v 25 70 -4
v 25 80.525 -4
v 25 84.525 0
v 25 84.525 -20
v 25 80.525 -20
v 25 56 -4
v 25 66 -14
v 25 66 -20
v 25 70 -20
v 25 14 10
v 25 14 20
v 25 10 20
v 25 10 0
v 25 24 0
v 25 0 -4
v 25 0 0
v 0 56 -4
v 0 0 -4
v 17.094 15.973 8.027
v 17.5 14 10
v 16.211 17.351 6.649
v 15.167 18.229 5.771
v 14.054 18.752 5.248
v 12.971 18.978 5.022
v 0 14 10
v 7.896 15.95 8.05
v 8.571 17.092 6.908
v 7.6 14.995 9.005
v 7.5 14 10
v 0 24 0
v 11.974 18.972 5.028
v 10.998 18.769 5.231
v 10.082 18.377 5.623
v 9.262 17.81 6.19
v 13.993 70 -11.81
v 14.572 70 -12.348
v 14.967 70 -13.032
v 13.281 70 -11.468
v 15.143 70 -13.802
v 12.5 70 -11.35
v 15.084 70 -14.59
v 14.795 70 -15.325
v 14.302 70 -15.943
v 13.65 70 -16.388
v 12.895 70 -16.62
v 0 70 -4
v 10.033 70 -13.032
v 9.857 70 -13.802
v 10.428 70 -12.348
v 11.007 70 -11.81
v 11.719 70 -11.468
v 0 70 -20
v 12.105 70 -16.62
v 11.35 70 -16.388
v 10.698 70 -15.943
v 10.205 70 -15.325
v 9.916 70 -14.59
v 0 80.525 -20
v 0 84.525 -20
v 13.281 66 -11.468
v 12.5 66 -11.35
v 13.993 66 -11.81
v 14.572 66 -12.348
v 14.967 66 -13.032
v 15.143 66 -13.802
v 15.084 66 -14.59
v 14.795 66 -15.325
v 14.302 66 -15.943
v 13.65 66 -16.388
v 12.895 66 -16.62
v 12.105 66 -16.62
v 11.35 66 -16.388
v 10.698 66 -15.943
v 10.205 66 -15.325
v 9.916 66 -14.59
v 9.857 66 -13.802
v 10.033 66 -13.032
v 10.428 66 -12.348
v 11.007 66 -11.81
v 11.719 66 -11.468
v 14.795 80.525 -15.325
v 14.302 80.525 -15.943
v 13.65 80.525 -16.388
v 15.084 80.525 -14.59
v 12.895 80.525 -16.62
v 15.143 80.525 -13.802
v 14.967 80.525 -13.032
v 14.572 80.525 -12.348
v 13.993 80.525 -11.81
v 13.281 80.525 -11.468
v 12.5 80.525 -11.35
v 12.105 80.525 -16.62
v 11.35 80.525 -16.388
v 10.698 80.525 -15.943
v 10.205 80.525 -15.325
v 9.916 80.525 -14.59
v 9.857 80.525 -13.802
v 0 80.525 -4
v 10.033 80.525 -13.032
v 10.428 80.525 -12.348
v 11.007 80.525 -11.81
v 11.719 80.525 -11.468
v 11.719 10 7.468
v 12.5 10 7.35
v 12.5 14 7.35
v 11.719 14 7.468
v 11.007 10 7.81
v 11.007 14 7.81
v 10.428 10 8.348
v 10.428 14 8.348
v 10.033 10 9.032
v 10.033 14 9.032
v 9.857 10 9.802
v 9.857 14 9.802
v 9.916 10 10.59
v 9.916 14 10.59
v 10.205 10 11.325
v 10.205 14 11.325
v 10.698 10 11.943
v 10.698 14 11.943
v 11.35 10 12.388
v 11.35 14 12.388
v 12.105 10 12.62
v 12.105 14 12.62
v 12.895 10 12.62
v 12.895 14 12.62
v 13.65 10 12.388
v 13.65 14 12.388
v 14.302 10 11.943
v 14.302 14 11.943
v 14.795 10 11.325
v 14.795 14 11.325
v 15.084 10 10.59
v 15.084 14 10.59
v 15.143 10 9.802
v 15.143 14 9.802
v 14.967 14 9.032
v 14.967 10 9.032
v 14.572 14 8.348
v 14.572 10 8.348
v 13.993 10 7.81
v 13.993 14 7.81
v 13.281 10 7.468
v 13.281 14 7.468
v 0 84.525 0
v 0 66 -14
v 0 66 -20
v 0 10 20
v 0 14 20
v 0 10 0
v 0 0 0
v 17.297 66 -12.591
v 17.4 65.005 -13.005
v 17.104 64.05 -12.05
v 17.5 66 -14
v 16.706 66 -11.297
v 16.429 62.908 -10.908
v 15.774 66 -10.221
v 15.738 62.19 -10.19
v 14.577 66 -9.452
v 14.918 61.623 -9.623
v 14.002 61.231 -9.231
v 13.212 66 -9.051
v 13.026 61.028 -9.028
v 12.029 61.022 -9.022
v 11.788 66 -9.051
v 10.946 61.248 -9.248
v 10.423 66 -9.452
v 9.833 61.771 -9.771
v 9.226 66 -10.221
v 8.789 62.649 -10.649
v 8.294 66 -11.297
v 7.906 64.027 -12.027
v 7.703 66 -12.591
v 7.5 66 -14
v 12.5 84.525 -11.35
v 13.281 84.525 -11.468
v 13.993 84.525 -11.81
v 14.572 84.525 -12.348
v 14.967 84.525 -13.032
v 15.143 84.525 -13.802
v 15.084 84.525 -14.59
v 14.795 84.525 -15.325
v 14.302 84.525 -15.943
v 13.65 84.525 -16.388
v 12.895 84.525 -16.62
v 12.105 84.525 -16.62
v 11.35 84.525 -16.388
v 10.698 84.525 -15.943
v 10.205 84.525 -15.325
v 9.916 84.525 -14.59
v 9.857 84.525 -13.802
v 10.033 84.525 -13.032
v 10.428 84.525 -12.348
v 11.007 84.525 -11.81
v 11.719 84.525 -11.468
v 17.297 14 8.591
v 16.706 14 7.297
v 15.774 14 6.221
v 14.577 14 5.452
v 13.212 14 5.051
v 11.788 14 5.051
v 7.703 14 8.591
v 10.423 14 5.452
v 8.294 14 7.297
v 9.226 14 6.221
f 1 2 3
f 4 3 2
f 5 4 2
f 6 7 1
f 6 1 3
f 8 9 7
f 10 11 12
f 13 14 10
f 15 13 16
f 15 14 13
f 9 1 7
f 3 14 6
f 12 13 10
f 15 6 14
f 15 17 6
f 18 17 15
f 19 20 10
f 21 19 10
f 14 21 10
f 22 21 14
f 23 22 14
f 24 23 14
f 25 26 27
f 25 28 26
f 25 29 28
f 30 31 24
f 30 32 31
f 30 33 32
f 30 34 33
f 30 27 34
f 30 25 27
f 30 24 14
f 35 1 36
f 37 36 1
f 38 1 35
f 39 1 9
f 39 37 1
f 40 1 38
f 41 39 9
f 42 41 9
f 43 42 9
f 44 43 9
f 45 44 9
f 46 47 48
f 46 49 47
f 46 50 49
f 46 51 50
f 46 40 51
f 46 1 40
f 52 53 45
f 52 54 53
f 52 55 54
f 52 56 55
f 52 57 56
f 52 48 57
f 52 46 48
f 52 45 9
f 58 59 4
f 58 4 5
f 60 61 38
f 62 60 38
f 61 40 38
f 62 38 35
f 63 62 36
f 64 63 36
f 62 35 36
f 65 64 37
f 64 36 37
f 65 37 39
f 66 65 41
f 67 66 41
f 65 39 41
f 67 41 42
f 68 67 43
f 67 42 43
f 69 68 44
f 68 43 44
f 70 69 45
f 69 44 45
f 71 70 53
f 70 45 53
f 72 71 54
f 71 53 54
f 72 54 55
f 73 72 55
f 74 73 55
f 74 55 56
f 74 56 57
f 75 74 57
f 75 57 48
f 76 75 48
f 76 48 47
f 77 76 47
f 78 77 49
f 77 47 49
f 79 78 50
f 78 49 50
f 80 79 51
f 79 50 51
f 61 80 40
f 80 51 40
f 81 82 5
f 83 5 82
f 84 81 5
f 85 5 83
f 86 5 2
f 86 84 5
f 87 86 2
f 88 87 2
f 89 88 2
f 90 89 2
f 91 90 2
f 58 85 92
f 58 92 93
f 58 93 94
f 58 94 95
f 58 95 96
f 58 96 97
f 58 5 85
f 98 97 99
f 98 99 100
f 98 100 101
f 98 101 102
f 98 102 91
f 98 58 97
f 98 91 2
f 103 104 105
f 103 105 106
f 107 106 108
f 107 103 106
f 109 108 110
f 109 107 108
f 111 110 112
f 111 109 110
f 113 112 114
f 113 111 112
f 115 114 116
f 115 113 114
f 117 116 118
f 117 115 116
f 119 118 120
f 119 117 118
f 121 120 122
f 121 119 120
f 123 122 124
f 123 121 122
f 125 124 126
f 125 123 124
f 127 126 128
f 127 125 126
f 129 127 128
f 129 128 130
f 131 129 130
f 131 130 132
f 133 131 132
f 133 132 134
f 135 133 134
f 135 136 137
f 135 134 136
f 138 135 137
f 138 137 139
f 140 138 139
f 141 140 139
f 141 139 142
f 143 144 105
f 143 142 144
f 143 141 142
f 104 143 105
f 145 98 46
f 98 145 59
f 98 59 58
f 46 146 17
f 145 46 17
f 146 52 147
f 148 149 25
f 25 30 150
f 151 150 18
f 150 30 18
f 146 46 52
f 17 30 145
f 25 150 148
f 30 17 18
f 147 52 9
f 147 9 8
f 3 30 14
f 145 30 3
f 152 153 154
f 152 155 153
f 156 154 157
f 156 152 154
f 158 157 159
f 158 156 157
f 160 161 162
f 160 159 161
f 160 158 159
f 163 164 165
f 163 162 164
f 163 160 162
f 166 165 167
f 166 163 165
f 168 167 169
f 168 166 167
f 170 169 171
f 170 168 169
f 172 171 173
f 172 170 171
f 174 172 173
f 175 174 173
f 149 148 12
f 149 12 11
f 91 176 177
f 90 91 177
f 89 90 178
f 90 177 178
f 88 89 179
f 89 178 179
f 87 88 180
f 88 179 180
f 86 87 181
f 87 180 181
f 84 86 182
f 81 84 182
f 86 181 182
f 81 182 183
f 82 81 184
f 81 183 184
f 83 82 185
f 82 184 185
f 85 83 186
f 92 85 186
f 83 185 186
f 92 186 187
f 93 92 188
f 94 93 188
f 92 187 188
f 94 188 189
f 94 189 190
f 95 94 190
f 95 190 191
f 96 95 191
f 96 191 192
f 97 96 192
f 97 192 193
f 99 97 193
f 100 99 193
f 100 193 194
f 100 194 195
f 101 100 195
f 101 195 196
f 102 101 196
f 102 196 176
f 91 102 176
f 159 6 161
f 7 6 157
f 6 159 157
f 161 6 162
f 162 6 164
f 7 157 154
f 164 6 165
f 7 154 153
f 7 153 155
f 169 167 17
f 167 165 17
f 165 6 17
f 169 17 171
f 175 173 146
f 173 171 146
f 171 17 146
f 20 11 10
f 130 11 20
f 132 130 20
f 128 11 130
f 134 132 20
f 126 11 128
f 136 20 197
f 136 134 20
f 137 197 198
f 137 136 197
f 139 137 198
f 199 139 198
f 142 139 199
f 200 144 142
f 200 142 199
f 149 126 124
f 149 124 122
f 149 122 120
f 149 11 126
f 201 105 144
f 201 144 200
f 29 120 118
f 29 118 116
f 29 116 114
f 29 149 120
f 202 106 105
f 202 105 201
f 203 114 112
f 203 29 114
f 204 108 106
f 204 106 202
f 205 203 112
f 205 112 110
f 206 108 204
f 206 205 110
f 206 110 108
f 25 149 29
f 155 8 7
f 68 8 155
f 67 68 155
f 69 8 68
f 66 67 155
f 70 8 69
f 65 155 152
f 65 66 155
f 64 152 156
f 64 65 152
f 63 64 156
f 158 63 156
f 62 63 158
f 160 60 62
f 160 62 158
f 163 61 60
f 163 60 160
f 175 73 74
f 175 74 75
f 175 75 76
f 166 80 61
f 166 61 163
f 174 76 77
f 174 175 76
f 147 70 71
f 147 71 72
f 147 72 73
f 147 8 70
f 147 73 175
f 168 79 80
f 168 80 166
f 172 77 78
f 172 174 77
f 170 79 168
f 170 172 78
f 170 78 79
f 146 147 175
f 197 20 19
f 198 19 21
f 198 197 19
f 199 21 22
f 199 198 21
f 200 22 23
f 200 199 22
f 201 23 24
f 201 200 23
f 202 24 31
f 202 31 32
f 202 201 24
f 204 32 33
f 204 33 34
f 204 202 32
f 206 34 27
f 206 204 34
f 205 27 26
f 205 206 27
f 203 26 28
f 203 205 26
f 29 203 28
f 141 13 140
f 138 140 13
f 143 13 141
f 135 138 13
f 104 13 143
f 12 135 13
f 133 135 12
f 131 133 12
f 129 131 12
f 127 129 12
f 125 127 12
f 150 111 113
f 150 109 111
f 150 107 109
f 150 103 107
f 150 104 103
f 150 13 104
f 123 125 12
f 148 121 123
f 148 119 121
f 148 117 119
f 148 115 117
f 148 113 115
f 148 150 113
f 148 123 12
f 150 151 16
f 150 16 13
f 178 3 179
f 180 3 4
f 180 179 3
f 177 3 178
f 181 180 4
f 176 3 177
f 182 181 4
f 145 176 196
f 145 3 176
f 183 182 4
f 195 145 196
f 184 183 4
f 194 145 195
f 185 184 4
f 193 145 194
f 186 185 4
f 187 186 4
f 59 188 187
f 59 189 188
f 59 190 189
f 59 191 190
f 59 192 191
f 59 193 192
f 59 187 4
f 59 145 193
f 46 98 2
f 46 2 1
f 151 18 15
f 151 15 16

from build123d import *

# Parameters (mm, degrees)
BOSS_EXTRUDE1_DEPTH     = 25
CUT_EXTRUDE1_DEPTH      = 6
CUT_EXTRUDE1_DEPTH_BACK = 6
SKETCH2_R               = 2.65
SKETCH3_R               = 2.65
CUT_EXTRUDE2_DEPTH      = 91.385151574
CHAMFER1_SIZE           = 10
SKETCH4_R               = 5
CUT_EXTRUDE4_DEPTH      = 6
CHAMFER2_SIZE           = 10
SKETCH5_R               = 5
CUT_EXTRUDE5_DEPTH      = 6


with BuildPart() as part:
    # Sketch1 → Boss-Extrude1 (new body)
    with BuildSketch(Plane(origin=(0, 0, 0), x_dir=(0, 0, -1), z_dir=(1, 0, 0))):
        Polygon((0, 0), (0, 10), (-20, 10), (-20, 14), (0, 14), (0, 84.525), (20, 84.525), (20, 80.525), (4, 80.525), (4, 70), (20, 70), (20, 66), (4, 66), (4, 0), align=None)
    extrude(amount=BOSS_EXTRUDE1_DEPTH)

    # Sketch2 → Cut-Extrude1 (cut, two sides: drawn at the far end of the back side and taken through both)
    with BuildSketch(Plane(origin=(0, 14, 0), x_dir=(1, 0, 0), z_dir=(0, 1, 0)).offset(-CUT_EXTRUDE1_DEPTH_BACK)):
        with Locations(Location((12.5, -10, 0), (0, 0, 90))):
            Circle(SKETCH2_R)
    extrude(amount=CUT_EXTRUDE1_DEPTH + CUT_EXTRUDE1_DEPTH_BACK, mode=Mode.SUBTRACT)

    # Sketch3 → Cut-Extrude2 (cut, through all)
    with BuildSketch(Plane(origin=(0, 84.525, 0), x_dir=(1, 0, 0), z_dir=(0, 1, 0))):
        with Locations(Location((12.5, 14, 0), (0, 0, 270))):
            Circle(SKETCH3_R)
    extrude(amount=-CUT_EXTRUDE2_DEPTH, mode=Mode.SUBTRACT)

    # Chamfer1
    # the kernel refuses this chamfer: 10 mm, written as the material it adds along each edge
    with BuildSketch(Plane(origin=(0, 14, 0), x_dir=(0, -0.027495876610586317, 0.9996219169112968), z_dir=(1, 0, 0))) as chamfer1_piece_1_section:
        Polygon((CHAMFER1_SIZE * 0.999621916911, -CHAMFER1_SIZE * 0.0274958766106), (-CHAMFER1_SIZE * 0.0274958766106, -CHAMFER1_SIZE * 0.999621916911), (0, 0), align=None)
    chamfer1_piece_1 = extrude(amount=25, mode=Mode.PRIVATE)
    chamfer1_piece_1 = chamfer1_piece_1 - Plane(origin=(12.5, 17.333000487, 10), x_dir=(0, 0, -1), z_dir=(0, 1, 0)) * Cylinder(2.65, 90, mode=Mode.PRIVATE)
    add(chamfer1_piece_1)

    # Sketch4 → Cut-Extrude4 (cut)
    with BuildSketch(Plane(origin=(0, 14, 0), x_dir=(1, 0, 0), z_dir=(0, 1, 0))):
        with Locations((12.5, -10)):
            Circle(SKETCH4_R)
    extrude(amount=CUT_EXTRUDE4_DEPTH, mode=Mode.SUBTRACT)

    # Chamfer2
    # the kernel refuses this chamfer: 10 mm, written as the material it adds along each edge
    with BuildSketch(Plane(origin=(0, 66, -4), x_dir=(0, -0.9996219169112968, 0.027495876610586233), z_dir=(1, 0, 0))) as chamfer2_piece_1_section:
        Polygon((CHAMFER2_SIZE * 0.999621916911, CHAMFER2_SIZE * 0.0274958766106), (-CHAMFER2_SIZE * 0.0274958766106, CHAMFER2_SIZE * 0.999621916911), (0, 0), align=None)
    chamfer2_piece_1 = extrude(amount=25, mode=Mode.PRIVATE)
    chamfer2_piece_1 = chamfer2_piece_1 - Plane(origin=(12.5, 62.667000224, -14), x_dir=(0, 0, 1), z_dir=(0, 1, 0)) * Cylinder(2.65, 90, mode=Mode.PRIVATE)
    add(chamfer2_piece_1)

    # Sketch5 → Cut-Extrude5 (cut)
    with BuildSketch(Plane.XZ.offset(-66)):
        with Locations((12.5, -14)):
            Circle(SKETCH5_R)
    extrude(amount=CUT_EXTRUDE5_DEPTH, mode=Mode.SUBTRACT)


solid = part.part
